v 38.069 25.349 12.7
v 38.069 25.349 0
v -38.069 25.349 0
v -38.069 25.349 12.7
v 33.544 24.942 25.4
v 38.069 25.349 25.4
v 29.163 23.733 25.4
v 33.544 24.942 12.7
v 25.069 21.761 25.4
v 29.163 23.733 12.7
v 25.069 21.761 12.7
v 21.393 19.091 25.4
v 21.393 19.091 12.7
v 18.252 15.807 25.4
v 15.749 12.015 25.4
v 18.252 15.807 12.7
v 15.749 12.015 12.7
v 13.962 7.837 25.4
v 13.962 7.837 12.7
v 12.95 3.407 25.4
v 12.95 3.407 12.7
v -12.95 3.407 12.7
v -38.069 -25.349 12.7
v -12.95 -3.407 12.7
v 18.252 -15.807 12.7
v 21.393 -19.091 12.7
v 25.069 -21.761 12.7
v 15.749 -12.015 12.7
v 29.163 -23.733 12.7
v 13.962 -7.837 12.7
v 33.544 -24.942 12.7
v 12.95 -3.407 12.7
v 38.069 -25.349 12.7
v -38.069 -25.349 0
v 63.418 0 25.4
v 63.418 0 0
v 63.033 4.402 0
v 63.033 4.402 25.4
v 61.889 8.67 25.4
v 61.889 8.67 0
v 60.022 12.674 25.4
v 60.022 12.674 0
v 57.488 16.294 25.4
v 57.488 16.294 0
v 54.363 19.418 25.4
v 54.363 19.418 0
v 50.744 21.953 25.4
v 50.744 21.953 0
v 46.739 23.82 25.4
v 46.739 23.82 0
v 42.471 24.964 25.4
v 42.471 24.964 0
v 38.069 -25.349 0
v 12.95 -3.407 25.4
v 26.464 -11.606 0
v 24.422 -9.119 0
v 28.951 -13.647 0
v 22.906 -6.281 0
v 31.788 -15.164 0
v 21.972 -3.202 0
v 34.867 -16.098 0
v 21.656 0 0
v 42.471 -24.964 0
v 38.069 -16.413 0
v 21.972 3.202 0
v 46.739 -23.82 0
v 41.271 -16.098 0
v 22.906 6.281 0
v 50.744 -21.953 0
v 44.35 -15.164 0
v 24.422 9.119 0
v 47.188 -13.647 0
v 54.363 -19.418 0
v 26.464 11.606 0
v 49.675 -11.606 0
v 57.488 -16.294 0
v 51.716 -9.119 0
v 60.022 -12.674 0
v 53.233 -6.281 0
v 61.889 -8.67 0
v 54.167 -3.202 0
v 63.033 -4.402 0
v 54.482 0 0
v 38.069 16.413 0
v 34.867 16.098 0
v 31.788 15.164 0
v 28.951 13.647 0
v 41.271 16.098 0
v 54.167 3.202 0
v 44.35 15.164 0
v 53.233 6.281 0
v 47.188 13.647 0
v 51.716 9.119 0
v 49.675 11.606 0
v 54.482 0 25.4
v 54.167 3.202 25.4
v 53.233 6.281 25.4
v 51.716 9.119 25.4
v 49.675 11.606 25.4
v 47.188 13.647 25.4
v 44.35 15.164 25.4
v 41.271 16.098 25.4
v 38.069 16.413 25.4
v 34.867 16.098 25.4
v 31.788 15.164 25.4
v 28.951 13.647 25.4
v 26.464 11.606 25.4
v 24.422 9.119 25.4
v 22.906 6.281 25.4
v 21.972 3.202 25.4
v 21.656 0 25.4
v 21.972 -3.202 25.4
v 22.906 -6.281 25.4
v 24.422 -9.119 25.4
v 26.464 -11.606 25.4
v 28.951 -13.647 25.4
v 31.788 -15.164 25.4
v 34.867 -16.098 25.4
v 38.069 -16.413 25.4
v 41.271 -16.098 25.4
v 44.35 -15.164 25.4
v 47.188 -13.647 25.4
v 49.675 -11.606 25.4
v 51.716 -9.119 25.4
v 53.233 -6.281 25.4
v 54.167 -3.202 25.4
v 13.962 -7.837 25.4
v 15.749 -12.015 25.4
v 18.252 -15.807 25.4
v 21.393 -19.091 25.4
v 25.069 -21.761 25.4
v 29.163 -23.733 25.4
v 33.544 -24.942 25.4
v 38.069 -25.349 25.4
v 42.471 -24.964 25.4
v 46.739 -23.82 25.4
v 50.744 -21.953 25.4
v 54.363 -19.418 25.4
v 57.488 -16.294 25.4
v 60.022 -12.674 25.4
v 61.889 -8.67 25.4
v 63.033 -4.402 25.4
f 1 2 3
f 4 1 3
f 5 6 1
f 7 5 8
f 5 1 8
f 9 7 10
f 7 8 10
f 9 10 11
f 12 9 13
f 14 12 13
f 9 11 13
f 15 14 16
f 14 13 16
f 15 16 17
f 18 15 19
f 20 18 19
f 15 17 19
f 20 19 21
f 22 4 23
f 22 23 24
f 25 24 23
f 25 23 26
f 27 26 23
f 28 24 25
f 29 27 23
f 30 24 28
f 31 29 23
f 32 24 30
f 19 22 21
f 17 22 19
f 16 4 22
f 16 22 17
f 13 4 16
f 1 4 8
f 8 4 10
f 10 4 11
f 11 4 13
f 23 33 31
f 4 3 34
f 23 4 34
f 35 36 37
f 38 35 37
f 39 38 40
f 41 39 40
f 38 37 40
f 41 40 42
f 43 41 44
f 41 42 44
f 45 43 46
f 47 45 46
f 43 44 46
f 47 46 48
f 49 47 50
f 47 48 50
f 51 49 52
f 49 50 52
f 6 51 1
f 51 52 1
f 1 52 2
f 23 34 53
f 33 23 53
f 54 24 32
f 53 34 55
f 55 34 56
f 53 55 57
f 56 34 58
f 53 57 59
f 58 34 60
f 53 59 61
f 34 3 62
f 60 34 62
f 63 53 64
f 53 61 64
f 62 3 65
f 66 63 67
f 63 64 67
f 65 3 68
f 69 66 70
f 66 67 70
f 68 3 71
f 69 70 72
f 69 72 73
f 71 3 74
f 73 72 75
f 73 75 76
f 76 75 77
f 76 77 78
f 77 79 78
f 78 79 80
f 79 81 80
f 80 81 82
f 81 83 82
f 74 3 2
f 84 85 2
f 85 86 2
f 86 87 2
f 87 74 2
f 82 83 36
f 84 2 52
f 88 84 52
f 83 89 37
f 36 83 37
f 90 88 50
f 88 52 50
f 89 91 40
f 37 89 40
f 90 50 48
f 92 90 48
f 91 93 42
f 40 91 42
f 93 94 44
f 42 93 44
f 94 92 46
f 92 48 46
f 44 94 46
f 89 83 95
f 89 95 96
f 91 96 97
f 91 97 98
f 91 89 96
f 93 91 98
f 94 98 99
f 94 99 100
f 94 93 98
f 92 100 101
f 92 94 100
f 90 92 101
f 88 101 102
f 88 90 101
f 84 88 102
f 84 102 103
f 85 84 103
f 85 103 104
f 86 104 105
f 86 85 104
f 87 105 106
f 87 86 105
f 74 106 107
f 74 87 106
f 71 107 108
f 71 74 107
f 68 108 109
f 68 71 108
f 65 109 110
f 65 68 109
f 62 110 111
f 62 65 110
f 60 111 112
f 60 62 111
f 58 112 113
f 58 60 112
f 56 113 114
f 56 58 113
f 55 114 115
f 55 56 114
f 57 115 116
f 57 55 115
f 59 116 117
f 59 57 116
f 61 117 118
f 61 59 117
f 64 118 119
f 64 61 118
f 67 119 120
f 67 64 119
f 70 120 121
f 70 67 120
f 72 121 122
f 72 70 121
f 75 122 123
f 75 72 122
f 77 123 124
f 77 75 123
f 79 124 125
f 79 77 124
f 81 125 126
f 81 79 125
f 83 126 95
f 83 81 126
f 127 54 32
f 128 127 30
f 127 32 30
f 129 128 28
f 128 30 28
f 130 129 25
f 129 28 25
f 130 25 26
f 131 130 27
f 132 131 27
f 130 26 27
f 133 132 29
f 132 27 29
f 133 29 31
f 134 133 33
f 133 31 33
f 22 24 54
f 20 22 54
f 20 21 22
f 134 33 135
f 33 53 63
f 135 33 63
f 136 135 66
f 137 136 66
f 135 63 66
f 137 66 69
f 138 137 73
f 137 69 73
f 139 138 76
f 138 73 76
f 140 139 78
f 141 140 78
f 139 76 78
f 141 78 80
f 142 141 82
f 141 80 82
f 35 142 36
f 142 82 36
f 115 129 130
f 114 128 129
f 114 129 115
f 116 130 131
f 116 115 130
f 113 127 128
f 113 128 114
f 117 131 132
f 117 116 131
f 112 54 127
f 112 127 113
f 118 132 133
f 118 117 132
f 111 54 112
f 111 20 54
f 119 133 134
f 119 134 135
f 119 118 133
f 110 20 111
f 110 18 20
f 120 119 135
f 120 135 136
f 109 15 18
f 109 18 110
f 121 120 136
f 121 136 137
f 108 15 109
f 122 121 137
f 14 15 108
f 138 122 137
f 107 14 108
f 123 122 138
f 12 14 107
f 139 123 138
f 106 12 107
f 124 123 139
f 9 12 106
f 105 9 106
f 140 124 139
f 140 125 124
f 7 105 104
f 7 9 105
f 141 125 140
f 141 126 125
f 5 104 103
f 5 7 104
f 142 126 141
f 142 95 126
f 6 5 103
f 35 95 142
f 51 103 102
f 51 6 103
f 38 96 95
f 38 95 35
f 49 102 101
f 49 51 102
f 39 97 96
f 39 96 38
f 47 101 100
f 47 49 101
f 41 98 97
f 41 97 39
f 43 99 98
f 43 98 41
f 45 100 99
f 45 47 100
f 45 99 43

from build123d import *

# Parameters (mm, degrees)
F0_R     = 16.413016
F1_DEPTH = 25.4
F2_DEPTH = 12.7
F4_DEPTH = 12.7
F6_DEPTH = 508


with BuildPart() as f1:
    # F0 (on Top) → F1 (new body)
    with BuildSketch(Plane.XY):
        with BuildLine():
            ThreePointArc((38.069274, 25.34879), (12.720484, 0), (38.069274, -25.34879))
            ThreePointArc((38.069274, -25.34879), (55.993576, -17.924301), (63.418064, 0))
            ThreePointArc((63.418064, 0), (55.993576, 17.924301), (38.069274, 25.34879))
        make_face()
        with Locations((38.069274, 0)):
            Circle(F0_R, mode=Mode.SUBTRACT)
    extrude(amount=F1_DEPTH)

    # F0 (on Top) → F2 (join)
    with BuildSketch(Plane.XY):
        with BuildLine():
            Line((-38.069274, 25.34879), (-38.069274, -25.34879))
            Line((-38.069274, -25.34879), (38.069274, -25.34879))
            ThreePointArc((38.069274, -25.34879), (12.720484, 0), (38.069274, 25.34879))
            Line((38.069274, 25.34879), (-38.069274, 25.34879))
        make_face()
    extrude(amount=F2_DEPTH)

    # F3 (on face) → F4 (join)
    with BuildSketch(Plane.XY.offset(12.7)):
        with BuildLine():
            ThreePointArc((12.950446, -3.406704), (12.720484, 0), (12.950446, 3.406704))
            Line((12.950446, 3.406704), (-12.950446, 3.406704))
            Line((-12.950446, 3.406704), (-12.950446, -3.406704))
            Line((-12.950446, -3.406704), (12.950446, -3.406704))
        make_face()
    extrude(amount=F4_DEPTH)

    # F5 (on face) → F6 (cut)
    with BuildSketch(Plane.XZ.offset(3.406704)):
        Polygon((-12.950446, 25.4), (-12.950446, 12.7), (12.950446, 25.4), align=None)
    extrude(amount=-F6_DEPTH, mode=Mode.SUBTRACT)


solid = f1.part
